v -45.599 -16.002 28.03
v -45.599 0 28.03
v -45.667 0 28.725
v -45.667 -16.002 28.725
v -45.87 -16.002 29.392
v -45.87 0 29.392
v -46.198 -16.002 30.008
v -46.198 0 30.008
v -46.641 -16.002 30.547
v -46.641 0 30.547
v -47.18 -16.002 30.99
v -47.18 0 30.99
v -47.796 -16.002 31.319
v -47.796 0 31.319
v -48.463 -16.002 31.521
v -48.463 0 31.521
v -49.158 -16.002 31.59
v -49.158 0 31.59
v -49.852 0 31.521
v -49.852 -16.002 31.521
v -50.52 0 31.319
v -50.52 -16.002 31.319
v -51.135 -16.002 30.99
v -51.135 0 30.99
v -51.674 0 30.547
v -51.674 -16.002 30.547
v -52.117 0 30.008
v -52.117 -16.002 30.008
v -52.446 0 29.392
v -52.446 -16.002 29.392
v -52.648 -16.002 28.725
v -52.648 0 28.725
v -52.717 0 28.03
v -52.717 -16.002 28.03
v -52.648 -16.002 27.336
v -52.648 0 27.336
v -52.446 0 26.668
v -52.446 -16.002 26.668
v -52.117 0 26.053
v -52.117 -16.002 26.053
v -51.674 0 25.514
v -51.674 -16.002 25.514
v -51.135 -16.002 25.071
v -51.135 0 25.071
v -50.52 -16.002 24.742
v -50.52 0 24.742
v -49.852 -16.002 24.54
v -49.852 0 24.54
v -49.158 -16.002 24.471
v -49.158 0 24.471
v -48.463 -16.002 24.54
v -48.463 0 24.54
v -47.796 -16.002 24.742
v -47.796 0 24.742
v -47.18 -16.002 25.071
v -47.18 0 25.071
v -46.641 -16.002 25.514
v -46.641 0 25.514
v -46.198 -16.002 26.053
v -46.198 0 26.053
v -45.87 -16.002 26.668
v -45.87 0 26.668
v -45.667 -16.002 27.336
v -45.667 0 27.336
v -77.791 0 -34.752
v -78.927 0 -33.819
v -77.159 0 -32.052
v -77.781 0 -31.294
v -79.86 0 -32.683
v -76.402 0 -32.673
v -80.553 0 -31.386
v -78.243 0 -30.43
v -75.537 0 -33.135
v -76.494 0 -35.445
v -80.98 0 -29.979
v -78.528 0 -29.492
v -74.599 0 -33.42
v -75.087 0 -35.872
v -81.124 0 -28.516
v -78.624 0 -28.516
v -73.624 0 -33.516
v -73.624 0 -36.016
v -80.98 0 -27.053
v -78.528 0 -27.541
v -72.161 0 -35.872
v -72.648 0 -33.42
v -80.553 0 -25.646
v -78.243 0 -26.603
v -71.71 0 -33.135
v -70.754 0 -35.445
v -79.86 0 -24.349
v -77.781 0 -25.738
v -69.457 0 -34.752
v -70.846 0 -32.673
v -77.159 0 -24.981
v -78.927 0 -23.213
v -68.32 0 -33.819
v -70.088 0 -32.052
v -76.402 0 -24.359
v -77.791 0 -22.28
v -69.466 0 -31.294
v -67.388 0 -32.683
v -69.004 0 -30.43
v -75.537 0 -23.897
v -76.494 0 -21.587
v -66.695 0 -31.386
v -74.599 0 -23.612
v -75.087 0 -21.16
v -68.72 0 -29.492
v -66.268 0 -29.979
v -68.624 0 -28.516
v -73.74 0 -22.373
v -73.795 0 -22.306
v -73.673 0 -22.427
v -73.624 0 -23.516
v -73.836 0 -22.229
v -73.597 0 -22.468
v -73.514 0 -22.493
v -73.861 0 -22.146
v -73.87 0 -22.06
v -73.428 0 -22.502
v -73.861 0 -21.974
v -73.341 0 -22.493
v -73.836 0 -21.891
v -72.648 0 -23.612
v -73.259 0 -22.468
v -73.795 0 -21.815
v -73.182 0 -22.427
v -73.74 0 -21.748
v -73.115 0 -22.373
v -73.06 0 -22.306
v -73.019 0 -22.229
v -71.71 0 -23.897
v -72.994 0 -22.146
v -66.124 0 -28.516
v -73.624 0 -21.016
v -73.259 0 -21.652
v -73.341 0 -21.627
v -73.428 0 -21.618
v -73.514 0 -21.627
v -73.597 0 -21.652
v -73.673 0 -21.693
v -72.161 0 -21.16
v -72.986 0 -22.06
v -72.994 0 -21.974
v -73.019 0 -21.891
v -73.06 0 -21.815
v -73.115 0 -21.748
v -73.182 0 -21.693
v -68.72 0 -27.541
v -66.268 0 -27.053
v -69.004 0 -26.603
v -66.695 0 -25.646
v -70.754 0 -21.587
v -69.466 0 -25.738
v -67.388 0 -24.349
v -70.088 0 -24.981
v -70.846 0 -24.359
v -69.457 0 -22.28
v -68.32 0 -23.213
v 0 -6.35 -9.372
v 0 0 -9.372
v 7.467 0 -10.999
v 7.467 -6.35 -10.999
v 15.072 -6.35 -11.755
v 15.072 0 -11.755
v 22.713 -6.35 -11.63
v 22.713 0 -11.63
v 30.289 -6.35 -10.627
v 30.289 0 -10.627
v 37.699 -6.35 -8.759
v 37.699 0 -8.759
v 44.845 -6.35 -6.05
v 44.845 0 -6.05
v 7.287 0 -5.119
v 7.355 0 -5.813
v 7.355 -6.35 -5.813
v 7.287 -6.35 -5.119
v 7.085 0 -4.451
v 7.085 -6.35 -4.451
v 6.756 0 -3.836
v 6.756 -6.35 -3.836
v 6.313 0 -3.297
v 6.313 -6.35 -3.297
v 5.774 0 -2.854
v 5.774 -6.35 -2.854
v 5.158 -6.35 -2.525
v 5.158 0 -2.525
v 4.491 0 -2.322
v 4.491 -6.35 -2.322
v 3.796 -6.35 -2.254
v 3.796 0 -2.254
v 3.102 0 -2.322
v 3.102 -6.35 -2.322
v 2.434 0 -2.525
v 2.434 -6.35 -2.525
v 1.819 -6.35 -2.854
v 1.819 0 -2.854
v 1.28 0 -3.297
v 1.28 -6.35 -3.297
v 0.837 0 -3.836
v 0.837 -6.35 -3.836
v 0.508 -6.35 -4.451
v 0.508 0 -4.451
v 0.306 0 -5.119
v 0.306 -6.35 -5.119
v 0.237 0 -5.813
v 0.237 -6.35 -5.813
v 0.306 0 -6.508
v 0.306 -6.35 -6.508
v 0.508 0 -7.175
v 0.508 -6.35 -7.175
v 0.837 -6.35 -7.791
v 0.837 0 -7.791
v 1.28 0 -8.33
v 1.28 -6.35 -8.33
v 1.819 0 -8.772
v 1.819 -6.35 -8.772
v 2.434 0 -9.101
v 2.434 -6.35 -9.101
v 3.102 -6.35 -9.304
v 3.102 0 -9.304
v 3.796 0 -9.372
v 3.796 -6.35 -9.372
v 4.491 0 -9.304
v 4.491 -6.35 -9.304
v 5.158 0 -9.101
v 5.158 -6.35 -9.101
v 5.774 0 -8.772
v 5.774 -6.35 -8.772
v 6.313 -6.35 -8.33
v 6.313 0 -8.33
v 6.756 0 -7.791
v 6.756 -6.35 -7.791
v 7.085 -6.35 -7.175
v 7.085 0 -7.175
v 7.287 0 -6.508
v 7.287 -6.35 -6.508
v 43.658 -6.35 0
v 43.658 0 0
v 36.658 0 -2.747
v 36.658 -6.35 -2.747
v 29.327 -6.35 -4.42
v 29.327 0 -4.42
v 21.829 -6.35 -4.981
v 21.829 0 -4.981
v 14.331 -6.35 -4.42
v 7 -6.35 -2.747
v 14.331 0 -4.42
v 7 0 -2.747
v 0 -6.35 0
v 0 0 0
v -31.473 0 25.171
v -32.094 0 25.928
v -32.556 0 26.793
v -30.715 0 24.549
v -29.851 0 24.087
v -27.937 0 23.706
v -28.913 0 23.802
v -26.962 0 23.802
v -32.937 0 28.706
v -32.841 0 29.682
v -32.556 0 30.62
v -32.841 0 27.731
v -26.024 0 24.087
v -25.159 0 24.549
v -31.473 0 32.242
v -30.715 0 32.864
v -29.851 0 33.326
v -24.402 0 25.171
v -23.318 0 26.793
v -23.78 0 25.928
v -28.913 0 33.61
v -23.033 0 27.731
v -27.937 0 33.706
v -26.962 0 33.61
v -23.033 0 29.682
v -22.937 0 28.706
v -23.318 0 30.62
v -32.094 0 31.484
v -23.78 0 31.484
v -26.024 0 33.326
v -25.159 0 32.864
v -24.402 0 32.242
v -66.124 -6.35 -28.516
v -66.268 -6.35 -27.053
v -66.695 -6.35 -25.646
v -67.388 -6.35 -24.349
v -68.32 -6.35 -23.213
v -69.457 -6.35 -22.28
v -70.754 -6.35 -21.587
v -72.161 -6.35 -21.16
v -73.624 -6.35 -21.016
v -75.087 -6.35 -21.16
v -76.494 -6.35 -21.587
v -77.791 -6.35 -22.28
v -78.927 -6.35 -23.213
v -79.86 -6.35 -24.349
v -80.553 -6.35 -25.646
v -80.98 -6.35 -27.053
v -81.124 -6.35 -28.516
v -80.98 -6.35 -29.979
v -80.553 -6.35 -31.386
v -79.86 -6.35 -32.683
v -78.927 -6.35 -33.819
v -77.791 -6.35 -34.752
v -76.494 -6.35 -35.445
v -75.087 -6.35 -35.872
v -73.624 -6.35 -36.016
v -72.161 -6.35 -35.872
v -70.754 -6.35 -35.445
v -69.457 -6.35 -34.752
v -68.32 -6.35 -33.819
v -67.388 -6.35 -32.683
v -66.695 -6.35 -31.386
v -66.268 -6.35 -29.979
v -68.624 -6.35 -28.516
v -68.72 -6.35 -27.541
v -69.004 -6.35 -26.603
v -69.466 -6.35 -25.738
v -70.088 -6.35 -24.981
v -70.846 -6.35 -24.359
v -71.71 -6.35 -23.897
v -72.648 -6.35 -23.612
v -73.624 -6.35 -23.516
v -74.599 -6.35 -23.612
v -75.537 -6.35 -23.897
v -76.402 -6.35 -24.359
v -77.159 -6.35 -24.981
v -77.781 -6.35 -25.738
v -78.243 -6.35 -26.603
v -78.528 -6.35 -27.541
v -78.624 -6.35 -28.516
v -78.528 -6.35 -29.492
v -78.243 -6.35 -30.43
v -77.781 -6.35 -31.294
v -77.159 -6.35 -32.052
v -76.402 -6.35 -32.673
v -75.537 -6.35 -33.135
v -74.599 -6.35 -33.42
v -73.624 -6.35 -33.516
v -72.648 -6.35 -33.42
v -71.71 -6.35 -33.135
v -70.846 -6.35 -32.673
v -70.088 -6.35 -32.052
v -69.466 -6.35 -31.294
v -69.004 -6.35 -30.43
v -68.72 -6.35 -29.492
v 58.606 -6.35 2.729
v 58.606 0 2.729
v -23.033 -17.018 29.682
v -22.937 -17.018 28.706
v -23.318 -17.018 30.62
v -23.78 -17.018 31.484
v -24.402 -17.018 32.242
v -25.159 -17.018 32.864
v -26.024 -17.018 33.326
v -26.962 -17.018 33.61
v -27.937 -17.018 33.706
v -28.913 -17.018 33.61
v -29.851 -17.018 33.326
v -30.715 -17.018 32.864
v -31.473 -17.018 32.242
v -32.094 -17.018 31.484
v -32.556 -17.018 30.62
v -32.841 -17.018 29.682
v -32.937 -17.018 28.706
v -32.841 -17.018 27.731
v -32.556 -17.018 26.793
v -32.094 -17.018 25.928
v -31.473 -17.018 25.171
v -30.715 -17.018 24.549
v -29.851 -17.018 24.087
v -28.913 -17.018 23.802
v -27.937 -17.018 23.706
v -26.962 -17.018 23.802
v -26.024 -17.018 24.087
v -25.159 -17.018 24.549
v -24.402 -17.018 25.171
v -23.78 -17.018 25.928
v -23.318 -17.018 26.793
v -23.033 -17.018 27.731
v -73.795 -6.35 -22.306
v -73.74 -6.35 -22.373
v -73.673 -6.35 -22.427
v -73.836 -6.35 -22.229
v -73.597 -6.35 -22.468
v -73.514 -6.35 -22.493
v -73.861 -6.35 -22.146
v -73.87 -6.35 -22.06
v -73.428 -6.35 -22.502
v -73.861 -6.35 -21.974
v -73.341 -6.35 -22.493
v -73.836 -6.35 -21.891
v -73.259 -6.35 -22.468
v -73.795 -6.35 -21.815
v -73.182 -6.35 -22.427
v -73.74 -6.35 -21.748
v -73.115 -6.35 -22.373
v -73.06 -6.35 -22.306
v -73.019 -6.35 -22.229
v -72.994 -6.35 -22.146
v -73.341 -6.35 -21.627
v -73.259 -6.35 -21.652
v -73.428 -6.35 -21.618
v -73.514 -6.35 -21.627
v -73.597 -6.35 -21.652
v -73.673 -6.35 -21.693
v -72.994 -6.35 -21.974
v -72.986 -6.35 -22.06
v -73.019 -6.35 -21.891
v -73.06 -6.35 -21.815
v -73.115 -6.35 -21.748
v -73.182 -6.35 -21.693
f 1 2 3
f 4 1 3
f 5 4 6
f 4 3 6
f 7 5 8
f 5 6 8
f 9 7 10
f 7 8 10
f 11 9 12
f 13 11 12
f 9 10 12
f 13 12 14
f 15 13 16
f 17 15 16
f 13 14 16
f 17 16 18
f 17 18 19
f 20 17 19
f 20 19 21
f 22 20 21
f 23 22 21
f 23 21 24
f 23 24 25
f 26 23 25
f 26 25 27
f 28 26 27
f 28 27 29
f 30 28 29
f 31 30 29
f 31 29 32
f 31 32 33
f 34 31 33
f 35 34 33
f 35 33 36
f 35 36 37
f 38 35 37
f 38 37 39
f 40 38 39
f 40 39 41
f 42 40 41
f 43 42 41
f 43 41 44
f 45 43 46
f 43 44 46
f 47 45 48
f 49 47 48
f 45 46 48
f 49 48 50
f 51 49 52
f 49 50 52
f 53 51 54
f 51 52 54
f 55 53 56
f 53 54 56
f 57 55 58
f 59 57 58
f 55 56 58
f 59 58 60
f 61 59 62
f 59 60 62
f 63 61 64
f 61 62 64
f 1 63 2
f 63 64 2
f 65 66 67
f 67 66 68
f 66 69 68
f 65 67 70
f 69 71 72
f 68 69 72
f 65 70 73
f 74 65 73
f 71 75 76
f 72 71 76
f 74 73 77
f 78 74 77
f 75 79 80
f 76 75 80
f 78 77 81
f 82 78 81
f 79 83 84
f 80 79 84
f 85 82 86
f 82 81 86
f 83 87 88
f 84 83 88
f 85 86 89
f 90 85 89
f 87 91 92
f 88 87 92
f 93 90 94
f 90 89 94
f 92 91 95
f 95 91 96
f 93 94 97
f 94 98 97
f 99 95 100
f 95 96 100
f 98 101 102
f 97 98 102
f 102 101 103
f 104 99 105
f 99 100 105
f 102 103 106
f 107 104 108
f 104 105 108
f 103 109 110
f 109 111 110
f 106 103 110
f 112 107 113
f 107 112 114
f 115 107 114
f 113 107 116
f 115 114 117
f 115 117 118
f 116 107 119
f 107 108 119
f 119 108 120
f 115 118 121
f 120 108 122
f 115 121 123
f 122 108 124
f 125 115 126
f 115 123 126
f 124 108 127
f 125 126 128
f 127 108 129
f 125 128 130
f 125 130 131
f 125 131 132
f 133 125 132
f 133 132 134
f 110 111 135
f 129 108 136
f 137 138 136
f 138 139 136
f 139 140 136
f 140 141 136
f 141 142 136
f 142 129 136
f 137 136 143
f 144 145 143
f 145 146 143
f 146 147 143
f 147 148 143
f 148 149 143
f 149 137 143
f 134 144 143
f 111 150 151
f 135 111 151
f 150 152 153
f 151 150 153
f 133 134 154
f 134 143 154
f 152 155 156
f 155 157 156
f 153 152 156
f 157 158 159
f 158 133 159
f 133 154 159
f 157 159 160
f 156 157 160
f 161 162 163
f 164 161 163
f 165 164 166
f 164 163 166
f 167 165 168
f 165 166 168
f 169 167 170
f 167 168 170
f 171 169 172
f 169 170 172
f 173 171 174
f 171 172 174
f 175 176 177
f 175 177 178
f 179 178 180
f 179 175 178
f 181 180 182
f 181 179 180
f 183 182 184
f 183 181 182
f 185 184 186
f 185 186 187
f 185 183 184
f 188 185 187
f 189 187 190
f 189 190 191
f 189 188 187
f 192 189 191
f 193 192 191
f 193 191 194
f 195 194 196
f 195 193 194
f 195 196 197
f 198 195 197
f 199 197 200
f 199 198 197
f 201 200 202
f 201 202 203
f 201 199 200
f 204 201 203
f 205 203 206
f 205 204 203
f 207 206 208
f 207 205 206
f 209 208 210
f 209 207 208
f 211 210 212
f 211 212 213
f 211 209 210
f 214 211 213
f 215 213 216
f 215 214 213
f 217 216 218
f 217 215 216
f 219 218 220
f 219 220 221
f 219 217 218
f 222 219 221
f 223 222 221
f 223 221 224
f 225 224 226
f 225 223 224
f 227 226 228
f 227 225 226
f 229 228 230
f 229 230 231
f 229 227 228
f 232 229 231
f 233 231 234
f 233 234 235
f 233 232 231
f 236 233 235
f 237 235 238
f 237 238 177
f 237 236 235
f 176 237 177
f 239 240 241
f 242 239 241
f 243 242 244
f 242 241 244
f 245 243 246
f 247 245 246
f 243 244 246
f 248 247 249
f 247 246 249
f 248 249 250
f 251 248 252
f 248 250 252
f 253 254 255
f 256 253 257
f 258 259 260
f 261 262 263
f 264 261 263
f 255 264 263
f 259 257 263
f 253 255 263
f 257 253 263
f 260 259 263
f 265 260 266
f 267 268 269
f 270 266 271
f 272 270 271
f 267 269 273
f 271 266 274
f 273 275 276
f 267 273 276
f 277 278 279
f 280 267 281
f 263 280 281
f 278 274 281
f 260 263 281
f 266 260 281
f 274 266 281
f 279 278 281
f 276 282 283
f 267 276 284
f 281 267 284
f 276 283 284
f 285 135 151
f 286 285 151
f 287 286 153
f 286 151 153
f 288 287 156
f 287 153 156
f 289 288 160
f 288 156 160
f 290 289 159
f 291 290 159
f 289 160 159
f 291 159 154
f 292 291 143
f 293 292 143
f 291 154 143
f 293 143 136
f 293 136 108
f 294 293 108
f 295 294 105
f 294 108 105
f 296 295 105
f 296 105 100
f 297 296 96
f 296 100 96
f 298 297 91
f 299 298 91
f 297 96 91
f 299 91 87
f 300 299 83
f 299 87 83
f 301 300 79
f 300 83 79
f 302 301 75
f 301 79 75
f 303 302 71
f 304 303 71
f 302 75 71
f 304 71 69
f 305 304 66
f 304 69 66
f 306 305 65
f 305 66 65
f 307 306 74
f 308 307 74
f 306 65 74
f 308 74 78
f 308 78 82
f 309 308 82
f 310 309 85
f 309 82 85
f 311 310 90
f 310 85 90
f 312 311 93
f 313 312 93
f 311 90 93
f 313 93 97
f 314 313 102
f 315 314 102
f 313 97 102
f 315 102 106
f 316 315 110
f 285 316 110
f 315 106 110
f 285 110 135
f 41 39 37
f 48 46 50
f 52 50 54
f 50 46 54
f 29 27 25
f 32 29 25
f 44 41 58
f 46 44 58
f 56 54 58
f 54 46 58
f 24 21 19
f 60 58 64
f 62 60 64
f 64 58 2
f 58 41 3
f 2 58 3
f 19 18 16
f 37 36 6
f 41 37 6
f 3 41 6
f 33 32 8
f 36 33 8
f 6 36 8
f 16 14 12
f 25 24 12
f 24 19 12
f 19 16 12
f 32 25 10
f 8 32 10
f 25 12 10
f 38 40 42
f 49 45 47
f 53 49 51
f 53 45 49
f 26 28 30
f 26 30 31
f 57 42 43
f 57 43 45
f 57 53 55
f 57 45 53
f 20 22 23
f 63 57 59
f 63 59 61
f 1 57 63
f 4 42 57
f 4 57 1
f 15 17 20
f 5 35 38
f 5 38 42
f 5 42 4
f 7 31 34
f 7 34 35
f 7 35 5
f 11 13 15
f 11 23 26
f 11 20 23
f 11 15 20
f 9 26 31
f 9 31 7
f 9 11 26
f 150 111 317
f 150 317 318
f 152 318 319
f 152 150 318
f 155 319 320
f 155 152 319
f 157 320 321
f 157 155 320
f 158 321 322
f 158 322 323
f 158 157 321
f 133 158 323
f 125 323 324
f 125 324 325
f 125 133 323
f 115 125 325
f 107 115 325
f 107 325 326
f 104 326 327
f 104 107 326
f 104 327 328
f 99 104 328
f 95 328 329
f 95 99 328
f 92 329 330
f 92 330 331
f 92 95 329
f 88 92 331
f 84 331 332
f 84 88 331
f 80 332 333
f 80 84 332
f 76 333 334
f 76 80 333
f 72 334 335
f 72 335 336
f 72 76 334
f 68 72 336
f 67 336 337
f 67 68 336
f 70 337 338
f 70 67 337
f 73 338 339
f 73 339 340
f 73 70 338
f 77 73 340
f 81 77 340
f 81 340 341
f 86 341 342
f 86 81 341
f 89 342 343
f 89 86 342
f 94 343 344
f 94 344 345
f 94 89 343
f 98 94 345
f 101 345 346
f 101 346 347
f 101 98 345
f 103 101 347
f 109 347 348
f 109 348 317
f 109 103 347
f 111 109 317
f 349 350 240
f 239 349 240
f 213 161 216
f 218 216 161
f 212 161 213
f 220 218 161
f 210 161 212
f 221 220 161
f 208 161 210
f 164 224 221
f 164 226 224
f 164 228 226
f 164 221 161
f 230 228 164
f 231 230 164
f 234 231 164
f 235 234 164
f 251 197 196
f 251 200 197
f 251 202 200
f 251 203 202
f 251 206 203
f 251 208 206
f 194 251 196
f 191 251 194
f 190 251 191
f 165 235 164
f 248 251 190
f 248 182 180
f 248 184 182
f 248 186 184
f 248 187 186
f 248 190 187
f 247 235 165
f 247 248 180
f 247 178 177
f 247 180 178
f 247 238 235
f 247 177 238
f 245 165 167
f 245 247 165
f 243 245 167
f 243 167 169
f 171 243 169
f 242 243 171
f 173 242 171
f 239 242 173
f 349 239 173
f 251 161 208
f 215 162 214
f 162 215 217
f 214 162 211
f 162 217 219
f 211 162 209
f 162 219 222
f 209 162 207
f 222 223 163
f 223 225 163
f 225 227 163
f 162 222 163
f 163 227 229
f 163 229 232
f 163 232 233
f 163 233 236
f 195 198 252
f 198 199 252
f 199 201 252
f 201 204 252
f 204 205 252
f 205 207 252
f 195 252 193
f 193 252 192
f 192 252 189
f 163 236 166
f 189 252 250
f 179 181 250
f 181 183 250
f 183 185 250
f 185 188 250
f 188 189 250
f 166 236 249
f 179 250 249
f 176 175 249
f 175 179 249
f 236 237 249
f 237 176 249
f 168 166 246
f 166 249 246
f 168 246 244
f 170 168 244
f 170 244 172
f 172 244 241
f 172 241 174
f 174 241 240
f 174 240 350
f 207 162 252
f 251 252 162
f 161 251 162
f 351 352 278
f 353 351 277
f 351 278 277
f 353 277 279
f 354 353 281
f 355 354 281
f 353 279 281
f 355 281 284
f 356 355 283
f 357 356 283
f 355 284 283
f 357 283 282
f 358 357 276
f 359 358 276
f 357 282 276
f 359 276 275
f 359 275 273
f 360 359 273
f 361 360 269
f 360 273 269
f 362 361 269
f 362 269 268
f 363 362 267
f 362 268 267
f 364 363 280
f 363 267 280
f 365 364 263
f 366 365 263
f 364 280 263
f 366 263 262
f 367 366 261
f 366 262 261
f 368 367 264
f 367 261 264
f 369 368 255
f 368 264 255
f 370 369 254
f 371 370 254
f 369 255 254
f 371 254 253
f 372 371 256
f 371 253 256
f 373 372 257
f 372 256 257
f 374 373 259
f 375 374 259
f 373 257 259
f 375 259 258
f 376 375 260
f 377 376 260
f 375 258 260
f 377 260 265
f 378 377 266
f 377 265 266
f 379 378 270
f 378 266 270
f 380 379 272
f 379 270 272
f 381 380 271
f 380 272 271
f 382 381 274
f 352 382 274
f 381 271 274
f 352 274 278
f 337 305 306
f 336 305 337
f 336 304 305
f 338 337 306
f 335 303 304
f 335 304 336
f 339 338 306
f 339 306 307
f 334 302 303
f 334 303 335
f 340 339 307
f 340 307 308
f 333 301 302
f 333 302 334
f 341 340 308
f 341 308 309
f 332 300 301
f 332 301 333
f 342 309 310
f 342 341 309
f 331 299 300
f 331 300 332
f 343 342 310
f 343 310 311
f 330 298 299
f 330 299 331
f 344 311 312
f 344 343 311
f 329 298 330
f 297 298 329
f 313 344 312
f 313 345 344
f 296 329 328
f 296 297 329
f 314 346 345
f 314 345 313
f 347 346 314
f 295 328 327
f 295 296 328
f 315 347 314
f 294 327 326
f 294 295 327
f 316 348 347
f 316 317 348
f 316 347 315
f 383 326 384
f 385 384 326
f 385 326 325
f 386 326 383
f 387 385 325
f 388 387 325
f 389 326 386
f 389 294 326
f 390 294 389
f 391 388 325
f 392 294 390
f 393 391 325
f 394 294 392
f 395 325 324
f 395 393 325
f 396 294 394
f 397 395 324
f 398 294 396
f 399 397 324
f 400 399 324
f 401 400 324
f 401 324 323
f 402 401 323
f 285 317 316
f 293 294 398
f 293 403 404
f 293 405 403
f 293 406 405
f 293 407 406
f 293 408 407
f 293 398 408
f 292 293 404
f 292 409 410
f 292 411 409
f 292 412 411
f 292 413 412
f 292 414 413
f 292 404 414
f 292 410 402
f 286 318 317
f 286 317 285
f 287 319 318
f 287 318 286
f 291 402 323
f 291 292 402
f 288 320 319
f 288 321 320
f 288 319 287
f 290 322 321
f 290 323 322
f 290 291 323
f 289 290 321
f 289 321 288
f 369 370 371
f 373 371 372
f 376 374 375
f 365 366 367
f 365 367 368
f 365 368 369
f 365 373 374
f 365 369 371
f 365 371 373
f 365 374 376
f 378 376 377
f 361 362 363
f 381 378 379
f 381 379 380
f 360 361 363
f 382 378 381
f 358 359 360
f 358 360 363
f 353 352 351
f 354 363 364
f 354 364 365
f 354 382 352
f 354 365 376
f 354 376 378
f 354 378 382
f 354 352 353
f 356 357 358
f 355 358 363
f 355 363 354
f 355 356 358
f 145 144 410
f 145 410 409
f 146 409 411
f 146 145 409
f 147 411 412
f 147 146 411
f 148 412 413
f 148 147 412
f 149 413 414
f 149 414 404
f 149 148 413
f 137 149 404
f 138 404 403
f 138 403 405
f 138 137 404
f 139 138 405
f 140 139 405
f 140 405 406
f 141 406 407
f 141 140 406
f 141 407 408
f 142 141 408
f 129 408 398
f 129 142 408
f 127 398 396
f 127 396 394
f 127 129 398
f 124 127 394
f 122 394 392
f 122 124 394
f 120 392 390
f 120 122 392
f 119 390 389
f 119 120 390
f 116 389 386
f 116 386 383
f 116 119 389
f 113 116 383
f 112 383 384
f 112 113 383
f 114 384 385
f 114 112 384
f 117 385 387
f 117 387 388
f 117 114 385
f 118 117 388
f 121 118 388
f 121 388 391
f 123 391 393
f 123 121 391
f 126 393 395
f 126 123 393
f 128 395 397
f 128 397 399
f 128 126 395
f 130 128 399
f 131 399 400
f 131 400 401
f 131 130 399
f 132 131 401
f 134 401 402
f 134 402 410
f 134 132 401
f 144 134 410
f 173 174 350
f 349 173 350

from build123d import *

# Parameters (mm, degrees)
F0_R     = 3.559092
F1_DEPTH = 6.35
F0_R_2   = 7.5
F0_R_3   = 5
F0_R_4   = 0.441854
F2_DEPTH = 6.35
F3_DEPTH = 16.002
F4_DEPTH = 17.018


with BuildPart() as f1:
    # F0 (on Front) → F1 (new body)
    with BuildSketch(Plane.XZ):
        with BuildLine():
            ThreePointArc((43.658202, 0), (21.829101, -4.981335), (0, 0))
            Line((0, 0), (0, -9.372278))
            ThreePointArc((0, -9.372278), (22.712581, -11.630374), (44.844568, -6.050457))
            Line((44.844568, -6.050457), (58.606395, 2.728639))
            Line((58.606395, 2.728639), (43.658202, 0))
        make_face()
        with Locations((3.796365, -5.813184)):
            Circle(F0_R, mode=Mode.SUBTRACT)
    extrude(amount=F1_DEPTH)


with BuildPart() as f2:
    # F0 (on Front) → F2 (new body)
    with BuildSketch(Plane.XZ):
        with Locations((-49.157687, 28.030444)):
            Circle(F0_R)
        with Locations((-73.623779, -28.516083)):
            Circle(F0_R_2)
        with Locations((-73.623779, -28.516083)):
            Circle(F0_R_3, mode=Mode.SUBTRACT)
        with Locations((-73.427692, -22.060107)):
            Circle(F0_R_4, mode=Mode.SUBTRACT)
    extrude(amount=F2_DEPTH)

    # F0 (on Front) → F3 (join)
    with BuildSketch(Plane.XZ):
        with Locations((-49.157687, 28.030444)):
            Circle(F0_R)
    extrude(amount=F3_DEPTH)


with BuildPart() as f4:
    # F0 (on Front) → F4 (new body)
    with BuildSketch(Plane.XZ):
        with Locations((-27.937101, 28.706206)):
            Circle(F0_R_3)
    extrude(amount=F4_DEPTH)


solid = Compound([f1.part, f2.part, f4.part])
